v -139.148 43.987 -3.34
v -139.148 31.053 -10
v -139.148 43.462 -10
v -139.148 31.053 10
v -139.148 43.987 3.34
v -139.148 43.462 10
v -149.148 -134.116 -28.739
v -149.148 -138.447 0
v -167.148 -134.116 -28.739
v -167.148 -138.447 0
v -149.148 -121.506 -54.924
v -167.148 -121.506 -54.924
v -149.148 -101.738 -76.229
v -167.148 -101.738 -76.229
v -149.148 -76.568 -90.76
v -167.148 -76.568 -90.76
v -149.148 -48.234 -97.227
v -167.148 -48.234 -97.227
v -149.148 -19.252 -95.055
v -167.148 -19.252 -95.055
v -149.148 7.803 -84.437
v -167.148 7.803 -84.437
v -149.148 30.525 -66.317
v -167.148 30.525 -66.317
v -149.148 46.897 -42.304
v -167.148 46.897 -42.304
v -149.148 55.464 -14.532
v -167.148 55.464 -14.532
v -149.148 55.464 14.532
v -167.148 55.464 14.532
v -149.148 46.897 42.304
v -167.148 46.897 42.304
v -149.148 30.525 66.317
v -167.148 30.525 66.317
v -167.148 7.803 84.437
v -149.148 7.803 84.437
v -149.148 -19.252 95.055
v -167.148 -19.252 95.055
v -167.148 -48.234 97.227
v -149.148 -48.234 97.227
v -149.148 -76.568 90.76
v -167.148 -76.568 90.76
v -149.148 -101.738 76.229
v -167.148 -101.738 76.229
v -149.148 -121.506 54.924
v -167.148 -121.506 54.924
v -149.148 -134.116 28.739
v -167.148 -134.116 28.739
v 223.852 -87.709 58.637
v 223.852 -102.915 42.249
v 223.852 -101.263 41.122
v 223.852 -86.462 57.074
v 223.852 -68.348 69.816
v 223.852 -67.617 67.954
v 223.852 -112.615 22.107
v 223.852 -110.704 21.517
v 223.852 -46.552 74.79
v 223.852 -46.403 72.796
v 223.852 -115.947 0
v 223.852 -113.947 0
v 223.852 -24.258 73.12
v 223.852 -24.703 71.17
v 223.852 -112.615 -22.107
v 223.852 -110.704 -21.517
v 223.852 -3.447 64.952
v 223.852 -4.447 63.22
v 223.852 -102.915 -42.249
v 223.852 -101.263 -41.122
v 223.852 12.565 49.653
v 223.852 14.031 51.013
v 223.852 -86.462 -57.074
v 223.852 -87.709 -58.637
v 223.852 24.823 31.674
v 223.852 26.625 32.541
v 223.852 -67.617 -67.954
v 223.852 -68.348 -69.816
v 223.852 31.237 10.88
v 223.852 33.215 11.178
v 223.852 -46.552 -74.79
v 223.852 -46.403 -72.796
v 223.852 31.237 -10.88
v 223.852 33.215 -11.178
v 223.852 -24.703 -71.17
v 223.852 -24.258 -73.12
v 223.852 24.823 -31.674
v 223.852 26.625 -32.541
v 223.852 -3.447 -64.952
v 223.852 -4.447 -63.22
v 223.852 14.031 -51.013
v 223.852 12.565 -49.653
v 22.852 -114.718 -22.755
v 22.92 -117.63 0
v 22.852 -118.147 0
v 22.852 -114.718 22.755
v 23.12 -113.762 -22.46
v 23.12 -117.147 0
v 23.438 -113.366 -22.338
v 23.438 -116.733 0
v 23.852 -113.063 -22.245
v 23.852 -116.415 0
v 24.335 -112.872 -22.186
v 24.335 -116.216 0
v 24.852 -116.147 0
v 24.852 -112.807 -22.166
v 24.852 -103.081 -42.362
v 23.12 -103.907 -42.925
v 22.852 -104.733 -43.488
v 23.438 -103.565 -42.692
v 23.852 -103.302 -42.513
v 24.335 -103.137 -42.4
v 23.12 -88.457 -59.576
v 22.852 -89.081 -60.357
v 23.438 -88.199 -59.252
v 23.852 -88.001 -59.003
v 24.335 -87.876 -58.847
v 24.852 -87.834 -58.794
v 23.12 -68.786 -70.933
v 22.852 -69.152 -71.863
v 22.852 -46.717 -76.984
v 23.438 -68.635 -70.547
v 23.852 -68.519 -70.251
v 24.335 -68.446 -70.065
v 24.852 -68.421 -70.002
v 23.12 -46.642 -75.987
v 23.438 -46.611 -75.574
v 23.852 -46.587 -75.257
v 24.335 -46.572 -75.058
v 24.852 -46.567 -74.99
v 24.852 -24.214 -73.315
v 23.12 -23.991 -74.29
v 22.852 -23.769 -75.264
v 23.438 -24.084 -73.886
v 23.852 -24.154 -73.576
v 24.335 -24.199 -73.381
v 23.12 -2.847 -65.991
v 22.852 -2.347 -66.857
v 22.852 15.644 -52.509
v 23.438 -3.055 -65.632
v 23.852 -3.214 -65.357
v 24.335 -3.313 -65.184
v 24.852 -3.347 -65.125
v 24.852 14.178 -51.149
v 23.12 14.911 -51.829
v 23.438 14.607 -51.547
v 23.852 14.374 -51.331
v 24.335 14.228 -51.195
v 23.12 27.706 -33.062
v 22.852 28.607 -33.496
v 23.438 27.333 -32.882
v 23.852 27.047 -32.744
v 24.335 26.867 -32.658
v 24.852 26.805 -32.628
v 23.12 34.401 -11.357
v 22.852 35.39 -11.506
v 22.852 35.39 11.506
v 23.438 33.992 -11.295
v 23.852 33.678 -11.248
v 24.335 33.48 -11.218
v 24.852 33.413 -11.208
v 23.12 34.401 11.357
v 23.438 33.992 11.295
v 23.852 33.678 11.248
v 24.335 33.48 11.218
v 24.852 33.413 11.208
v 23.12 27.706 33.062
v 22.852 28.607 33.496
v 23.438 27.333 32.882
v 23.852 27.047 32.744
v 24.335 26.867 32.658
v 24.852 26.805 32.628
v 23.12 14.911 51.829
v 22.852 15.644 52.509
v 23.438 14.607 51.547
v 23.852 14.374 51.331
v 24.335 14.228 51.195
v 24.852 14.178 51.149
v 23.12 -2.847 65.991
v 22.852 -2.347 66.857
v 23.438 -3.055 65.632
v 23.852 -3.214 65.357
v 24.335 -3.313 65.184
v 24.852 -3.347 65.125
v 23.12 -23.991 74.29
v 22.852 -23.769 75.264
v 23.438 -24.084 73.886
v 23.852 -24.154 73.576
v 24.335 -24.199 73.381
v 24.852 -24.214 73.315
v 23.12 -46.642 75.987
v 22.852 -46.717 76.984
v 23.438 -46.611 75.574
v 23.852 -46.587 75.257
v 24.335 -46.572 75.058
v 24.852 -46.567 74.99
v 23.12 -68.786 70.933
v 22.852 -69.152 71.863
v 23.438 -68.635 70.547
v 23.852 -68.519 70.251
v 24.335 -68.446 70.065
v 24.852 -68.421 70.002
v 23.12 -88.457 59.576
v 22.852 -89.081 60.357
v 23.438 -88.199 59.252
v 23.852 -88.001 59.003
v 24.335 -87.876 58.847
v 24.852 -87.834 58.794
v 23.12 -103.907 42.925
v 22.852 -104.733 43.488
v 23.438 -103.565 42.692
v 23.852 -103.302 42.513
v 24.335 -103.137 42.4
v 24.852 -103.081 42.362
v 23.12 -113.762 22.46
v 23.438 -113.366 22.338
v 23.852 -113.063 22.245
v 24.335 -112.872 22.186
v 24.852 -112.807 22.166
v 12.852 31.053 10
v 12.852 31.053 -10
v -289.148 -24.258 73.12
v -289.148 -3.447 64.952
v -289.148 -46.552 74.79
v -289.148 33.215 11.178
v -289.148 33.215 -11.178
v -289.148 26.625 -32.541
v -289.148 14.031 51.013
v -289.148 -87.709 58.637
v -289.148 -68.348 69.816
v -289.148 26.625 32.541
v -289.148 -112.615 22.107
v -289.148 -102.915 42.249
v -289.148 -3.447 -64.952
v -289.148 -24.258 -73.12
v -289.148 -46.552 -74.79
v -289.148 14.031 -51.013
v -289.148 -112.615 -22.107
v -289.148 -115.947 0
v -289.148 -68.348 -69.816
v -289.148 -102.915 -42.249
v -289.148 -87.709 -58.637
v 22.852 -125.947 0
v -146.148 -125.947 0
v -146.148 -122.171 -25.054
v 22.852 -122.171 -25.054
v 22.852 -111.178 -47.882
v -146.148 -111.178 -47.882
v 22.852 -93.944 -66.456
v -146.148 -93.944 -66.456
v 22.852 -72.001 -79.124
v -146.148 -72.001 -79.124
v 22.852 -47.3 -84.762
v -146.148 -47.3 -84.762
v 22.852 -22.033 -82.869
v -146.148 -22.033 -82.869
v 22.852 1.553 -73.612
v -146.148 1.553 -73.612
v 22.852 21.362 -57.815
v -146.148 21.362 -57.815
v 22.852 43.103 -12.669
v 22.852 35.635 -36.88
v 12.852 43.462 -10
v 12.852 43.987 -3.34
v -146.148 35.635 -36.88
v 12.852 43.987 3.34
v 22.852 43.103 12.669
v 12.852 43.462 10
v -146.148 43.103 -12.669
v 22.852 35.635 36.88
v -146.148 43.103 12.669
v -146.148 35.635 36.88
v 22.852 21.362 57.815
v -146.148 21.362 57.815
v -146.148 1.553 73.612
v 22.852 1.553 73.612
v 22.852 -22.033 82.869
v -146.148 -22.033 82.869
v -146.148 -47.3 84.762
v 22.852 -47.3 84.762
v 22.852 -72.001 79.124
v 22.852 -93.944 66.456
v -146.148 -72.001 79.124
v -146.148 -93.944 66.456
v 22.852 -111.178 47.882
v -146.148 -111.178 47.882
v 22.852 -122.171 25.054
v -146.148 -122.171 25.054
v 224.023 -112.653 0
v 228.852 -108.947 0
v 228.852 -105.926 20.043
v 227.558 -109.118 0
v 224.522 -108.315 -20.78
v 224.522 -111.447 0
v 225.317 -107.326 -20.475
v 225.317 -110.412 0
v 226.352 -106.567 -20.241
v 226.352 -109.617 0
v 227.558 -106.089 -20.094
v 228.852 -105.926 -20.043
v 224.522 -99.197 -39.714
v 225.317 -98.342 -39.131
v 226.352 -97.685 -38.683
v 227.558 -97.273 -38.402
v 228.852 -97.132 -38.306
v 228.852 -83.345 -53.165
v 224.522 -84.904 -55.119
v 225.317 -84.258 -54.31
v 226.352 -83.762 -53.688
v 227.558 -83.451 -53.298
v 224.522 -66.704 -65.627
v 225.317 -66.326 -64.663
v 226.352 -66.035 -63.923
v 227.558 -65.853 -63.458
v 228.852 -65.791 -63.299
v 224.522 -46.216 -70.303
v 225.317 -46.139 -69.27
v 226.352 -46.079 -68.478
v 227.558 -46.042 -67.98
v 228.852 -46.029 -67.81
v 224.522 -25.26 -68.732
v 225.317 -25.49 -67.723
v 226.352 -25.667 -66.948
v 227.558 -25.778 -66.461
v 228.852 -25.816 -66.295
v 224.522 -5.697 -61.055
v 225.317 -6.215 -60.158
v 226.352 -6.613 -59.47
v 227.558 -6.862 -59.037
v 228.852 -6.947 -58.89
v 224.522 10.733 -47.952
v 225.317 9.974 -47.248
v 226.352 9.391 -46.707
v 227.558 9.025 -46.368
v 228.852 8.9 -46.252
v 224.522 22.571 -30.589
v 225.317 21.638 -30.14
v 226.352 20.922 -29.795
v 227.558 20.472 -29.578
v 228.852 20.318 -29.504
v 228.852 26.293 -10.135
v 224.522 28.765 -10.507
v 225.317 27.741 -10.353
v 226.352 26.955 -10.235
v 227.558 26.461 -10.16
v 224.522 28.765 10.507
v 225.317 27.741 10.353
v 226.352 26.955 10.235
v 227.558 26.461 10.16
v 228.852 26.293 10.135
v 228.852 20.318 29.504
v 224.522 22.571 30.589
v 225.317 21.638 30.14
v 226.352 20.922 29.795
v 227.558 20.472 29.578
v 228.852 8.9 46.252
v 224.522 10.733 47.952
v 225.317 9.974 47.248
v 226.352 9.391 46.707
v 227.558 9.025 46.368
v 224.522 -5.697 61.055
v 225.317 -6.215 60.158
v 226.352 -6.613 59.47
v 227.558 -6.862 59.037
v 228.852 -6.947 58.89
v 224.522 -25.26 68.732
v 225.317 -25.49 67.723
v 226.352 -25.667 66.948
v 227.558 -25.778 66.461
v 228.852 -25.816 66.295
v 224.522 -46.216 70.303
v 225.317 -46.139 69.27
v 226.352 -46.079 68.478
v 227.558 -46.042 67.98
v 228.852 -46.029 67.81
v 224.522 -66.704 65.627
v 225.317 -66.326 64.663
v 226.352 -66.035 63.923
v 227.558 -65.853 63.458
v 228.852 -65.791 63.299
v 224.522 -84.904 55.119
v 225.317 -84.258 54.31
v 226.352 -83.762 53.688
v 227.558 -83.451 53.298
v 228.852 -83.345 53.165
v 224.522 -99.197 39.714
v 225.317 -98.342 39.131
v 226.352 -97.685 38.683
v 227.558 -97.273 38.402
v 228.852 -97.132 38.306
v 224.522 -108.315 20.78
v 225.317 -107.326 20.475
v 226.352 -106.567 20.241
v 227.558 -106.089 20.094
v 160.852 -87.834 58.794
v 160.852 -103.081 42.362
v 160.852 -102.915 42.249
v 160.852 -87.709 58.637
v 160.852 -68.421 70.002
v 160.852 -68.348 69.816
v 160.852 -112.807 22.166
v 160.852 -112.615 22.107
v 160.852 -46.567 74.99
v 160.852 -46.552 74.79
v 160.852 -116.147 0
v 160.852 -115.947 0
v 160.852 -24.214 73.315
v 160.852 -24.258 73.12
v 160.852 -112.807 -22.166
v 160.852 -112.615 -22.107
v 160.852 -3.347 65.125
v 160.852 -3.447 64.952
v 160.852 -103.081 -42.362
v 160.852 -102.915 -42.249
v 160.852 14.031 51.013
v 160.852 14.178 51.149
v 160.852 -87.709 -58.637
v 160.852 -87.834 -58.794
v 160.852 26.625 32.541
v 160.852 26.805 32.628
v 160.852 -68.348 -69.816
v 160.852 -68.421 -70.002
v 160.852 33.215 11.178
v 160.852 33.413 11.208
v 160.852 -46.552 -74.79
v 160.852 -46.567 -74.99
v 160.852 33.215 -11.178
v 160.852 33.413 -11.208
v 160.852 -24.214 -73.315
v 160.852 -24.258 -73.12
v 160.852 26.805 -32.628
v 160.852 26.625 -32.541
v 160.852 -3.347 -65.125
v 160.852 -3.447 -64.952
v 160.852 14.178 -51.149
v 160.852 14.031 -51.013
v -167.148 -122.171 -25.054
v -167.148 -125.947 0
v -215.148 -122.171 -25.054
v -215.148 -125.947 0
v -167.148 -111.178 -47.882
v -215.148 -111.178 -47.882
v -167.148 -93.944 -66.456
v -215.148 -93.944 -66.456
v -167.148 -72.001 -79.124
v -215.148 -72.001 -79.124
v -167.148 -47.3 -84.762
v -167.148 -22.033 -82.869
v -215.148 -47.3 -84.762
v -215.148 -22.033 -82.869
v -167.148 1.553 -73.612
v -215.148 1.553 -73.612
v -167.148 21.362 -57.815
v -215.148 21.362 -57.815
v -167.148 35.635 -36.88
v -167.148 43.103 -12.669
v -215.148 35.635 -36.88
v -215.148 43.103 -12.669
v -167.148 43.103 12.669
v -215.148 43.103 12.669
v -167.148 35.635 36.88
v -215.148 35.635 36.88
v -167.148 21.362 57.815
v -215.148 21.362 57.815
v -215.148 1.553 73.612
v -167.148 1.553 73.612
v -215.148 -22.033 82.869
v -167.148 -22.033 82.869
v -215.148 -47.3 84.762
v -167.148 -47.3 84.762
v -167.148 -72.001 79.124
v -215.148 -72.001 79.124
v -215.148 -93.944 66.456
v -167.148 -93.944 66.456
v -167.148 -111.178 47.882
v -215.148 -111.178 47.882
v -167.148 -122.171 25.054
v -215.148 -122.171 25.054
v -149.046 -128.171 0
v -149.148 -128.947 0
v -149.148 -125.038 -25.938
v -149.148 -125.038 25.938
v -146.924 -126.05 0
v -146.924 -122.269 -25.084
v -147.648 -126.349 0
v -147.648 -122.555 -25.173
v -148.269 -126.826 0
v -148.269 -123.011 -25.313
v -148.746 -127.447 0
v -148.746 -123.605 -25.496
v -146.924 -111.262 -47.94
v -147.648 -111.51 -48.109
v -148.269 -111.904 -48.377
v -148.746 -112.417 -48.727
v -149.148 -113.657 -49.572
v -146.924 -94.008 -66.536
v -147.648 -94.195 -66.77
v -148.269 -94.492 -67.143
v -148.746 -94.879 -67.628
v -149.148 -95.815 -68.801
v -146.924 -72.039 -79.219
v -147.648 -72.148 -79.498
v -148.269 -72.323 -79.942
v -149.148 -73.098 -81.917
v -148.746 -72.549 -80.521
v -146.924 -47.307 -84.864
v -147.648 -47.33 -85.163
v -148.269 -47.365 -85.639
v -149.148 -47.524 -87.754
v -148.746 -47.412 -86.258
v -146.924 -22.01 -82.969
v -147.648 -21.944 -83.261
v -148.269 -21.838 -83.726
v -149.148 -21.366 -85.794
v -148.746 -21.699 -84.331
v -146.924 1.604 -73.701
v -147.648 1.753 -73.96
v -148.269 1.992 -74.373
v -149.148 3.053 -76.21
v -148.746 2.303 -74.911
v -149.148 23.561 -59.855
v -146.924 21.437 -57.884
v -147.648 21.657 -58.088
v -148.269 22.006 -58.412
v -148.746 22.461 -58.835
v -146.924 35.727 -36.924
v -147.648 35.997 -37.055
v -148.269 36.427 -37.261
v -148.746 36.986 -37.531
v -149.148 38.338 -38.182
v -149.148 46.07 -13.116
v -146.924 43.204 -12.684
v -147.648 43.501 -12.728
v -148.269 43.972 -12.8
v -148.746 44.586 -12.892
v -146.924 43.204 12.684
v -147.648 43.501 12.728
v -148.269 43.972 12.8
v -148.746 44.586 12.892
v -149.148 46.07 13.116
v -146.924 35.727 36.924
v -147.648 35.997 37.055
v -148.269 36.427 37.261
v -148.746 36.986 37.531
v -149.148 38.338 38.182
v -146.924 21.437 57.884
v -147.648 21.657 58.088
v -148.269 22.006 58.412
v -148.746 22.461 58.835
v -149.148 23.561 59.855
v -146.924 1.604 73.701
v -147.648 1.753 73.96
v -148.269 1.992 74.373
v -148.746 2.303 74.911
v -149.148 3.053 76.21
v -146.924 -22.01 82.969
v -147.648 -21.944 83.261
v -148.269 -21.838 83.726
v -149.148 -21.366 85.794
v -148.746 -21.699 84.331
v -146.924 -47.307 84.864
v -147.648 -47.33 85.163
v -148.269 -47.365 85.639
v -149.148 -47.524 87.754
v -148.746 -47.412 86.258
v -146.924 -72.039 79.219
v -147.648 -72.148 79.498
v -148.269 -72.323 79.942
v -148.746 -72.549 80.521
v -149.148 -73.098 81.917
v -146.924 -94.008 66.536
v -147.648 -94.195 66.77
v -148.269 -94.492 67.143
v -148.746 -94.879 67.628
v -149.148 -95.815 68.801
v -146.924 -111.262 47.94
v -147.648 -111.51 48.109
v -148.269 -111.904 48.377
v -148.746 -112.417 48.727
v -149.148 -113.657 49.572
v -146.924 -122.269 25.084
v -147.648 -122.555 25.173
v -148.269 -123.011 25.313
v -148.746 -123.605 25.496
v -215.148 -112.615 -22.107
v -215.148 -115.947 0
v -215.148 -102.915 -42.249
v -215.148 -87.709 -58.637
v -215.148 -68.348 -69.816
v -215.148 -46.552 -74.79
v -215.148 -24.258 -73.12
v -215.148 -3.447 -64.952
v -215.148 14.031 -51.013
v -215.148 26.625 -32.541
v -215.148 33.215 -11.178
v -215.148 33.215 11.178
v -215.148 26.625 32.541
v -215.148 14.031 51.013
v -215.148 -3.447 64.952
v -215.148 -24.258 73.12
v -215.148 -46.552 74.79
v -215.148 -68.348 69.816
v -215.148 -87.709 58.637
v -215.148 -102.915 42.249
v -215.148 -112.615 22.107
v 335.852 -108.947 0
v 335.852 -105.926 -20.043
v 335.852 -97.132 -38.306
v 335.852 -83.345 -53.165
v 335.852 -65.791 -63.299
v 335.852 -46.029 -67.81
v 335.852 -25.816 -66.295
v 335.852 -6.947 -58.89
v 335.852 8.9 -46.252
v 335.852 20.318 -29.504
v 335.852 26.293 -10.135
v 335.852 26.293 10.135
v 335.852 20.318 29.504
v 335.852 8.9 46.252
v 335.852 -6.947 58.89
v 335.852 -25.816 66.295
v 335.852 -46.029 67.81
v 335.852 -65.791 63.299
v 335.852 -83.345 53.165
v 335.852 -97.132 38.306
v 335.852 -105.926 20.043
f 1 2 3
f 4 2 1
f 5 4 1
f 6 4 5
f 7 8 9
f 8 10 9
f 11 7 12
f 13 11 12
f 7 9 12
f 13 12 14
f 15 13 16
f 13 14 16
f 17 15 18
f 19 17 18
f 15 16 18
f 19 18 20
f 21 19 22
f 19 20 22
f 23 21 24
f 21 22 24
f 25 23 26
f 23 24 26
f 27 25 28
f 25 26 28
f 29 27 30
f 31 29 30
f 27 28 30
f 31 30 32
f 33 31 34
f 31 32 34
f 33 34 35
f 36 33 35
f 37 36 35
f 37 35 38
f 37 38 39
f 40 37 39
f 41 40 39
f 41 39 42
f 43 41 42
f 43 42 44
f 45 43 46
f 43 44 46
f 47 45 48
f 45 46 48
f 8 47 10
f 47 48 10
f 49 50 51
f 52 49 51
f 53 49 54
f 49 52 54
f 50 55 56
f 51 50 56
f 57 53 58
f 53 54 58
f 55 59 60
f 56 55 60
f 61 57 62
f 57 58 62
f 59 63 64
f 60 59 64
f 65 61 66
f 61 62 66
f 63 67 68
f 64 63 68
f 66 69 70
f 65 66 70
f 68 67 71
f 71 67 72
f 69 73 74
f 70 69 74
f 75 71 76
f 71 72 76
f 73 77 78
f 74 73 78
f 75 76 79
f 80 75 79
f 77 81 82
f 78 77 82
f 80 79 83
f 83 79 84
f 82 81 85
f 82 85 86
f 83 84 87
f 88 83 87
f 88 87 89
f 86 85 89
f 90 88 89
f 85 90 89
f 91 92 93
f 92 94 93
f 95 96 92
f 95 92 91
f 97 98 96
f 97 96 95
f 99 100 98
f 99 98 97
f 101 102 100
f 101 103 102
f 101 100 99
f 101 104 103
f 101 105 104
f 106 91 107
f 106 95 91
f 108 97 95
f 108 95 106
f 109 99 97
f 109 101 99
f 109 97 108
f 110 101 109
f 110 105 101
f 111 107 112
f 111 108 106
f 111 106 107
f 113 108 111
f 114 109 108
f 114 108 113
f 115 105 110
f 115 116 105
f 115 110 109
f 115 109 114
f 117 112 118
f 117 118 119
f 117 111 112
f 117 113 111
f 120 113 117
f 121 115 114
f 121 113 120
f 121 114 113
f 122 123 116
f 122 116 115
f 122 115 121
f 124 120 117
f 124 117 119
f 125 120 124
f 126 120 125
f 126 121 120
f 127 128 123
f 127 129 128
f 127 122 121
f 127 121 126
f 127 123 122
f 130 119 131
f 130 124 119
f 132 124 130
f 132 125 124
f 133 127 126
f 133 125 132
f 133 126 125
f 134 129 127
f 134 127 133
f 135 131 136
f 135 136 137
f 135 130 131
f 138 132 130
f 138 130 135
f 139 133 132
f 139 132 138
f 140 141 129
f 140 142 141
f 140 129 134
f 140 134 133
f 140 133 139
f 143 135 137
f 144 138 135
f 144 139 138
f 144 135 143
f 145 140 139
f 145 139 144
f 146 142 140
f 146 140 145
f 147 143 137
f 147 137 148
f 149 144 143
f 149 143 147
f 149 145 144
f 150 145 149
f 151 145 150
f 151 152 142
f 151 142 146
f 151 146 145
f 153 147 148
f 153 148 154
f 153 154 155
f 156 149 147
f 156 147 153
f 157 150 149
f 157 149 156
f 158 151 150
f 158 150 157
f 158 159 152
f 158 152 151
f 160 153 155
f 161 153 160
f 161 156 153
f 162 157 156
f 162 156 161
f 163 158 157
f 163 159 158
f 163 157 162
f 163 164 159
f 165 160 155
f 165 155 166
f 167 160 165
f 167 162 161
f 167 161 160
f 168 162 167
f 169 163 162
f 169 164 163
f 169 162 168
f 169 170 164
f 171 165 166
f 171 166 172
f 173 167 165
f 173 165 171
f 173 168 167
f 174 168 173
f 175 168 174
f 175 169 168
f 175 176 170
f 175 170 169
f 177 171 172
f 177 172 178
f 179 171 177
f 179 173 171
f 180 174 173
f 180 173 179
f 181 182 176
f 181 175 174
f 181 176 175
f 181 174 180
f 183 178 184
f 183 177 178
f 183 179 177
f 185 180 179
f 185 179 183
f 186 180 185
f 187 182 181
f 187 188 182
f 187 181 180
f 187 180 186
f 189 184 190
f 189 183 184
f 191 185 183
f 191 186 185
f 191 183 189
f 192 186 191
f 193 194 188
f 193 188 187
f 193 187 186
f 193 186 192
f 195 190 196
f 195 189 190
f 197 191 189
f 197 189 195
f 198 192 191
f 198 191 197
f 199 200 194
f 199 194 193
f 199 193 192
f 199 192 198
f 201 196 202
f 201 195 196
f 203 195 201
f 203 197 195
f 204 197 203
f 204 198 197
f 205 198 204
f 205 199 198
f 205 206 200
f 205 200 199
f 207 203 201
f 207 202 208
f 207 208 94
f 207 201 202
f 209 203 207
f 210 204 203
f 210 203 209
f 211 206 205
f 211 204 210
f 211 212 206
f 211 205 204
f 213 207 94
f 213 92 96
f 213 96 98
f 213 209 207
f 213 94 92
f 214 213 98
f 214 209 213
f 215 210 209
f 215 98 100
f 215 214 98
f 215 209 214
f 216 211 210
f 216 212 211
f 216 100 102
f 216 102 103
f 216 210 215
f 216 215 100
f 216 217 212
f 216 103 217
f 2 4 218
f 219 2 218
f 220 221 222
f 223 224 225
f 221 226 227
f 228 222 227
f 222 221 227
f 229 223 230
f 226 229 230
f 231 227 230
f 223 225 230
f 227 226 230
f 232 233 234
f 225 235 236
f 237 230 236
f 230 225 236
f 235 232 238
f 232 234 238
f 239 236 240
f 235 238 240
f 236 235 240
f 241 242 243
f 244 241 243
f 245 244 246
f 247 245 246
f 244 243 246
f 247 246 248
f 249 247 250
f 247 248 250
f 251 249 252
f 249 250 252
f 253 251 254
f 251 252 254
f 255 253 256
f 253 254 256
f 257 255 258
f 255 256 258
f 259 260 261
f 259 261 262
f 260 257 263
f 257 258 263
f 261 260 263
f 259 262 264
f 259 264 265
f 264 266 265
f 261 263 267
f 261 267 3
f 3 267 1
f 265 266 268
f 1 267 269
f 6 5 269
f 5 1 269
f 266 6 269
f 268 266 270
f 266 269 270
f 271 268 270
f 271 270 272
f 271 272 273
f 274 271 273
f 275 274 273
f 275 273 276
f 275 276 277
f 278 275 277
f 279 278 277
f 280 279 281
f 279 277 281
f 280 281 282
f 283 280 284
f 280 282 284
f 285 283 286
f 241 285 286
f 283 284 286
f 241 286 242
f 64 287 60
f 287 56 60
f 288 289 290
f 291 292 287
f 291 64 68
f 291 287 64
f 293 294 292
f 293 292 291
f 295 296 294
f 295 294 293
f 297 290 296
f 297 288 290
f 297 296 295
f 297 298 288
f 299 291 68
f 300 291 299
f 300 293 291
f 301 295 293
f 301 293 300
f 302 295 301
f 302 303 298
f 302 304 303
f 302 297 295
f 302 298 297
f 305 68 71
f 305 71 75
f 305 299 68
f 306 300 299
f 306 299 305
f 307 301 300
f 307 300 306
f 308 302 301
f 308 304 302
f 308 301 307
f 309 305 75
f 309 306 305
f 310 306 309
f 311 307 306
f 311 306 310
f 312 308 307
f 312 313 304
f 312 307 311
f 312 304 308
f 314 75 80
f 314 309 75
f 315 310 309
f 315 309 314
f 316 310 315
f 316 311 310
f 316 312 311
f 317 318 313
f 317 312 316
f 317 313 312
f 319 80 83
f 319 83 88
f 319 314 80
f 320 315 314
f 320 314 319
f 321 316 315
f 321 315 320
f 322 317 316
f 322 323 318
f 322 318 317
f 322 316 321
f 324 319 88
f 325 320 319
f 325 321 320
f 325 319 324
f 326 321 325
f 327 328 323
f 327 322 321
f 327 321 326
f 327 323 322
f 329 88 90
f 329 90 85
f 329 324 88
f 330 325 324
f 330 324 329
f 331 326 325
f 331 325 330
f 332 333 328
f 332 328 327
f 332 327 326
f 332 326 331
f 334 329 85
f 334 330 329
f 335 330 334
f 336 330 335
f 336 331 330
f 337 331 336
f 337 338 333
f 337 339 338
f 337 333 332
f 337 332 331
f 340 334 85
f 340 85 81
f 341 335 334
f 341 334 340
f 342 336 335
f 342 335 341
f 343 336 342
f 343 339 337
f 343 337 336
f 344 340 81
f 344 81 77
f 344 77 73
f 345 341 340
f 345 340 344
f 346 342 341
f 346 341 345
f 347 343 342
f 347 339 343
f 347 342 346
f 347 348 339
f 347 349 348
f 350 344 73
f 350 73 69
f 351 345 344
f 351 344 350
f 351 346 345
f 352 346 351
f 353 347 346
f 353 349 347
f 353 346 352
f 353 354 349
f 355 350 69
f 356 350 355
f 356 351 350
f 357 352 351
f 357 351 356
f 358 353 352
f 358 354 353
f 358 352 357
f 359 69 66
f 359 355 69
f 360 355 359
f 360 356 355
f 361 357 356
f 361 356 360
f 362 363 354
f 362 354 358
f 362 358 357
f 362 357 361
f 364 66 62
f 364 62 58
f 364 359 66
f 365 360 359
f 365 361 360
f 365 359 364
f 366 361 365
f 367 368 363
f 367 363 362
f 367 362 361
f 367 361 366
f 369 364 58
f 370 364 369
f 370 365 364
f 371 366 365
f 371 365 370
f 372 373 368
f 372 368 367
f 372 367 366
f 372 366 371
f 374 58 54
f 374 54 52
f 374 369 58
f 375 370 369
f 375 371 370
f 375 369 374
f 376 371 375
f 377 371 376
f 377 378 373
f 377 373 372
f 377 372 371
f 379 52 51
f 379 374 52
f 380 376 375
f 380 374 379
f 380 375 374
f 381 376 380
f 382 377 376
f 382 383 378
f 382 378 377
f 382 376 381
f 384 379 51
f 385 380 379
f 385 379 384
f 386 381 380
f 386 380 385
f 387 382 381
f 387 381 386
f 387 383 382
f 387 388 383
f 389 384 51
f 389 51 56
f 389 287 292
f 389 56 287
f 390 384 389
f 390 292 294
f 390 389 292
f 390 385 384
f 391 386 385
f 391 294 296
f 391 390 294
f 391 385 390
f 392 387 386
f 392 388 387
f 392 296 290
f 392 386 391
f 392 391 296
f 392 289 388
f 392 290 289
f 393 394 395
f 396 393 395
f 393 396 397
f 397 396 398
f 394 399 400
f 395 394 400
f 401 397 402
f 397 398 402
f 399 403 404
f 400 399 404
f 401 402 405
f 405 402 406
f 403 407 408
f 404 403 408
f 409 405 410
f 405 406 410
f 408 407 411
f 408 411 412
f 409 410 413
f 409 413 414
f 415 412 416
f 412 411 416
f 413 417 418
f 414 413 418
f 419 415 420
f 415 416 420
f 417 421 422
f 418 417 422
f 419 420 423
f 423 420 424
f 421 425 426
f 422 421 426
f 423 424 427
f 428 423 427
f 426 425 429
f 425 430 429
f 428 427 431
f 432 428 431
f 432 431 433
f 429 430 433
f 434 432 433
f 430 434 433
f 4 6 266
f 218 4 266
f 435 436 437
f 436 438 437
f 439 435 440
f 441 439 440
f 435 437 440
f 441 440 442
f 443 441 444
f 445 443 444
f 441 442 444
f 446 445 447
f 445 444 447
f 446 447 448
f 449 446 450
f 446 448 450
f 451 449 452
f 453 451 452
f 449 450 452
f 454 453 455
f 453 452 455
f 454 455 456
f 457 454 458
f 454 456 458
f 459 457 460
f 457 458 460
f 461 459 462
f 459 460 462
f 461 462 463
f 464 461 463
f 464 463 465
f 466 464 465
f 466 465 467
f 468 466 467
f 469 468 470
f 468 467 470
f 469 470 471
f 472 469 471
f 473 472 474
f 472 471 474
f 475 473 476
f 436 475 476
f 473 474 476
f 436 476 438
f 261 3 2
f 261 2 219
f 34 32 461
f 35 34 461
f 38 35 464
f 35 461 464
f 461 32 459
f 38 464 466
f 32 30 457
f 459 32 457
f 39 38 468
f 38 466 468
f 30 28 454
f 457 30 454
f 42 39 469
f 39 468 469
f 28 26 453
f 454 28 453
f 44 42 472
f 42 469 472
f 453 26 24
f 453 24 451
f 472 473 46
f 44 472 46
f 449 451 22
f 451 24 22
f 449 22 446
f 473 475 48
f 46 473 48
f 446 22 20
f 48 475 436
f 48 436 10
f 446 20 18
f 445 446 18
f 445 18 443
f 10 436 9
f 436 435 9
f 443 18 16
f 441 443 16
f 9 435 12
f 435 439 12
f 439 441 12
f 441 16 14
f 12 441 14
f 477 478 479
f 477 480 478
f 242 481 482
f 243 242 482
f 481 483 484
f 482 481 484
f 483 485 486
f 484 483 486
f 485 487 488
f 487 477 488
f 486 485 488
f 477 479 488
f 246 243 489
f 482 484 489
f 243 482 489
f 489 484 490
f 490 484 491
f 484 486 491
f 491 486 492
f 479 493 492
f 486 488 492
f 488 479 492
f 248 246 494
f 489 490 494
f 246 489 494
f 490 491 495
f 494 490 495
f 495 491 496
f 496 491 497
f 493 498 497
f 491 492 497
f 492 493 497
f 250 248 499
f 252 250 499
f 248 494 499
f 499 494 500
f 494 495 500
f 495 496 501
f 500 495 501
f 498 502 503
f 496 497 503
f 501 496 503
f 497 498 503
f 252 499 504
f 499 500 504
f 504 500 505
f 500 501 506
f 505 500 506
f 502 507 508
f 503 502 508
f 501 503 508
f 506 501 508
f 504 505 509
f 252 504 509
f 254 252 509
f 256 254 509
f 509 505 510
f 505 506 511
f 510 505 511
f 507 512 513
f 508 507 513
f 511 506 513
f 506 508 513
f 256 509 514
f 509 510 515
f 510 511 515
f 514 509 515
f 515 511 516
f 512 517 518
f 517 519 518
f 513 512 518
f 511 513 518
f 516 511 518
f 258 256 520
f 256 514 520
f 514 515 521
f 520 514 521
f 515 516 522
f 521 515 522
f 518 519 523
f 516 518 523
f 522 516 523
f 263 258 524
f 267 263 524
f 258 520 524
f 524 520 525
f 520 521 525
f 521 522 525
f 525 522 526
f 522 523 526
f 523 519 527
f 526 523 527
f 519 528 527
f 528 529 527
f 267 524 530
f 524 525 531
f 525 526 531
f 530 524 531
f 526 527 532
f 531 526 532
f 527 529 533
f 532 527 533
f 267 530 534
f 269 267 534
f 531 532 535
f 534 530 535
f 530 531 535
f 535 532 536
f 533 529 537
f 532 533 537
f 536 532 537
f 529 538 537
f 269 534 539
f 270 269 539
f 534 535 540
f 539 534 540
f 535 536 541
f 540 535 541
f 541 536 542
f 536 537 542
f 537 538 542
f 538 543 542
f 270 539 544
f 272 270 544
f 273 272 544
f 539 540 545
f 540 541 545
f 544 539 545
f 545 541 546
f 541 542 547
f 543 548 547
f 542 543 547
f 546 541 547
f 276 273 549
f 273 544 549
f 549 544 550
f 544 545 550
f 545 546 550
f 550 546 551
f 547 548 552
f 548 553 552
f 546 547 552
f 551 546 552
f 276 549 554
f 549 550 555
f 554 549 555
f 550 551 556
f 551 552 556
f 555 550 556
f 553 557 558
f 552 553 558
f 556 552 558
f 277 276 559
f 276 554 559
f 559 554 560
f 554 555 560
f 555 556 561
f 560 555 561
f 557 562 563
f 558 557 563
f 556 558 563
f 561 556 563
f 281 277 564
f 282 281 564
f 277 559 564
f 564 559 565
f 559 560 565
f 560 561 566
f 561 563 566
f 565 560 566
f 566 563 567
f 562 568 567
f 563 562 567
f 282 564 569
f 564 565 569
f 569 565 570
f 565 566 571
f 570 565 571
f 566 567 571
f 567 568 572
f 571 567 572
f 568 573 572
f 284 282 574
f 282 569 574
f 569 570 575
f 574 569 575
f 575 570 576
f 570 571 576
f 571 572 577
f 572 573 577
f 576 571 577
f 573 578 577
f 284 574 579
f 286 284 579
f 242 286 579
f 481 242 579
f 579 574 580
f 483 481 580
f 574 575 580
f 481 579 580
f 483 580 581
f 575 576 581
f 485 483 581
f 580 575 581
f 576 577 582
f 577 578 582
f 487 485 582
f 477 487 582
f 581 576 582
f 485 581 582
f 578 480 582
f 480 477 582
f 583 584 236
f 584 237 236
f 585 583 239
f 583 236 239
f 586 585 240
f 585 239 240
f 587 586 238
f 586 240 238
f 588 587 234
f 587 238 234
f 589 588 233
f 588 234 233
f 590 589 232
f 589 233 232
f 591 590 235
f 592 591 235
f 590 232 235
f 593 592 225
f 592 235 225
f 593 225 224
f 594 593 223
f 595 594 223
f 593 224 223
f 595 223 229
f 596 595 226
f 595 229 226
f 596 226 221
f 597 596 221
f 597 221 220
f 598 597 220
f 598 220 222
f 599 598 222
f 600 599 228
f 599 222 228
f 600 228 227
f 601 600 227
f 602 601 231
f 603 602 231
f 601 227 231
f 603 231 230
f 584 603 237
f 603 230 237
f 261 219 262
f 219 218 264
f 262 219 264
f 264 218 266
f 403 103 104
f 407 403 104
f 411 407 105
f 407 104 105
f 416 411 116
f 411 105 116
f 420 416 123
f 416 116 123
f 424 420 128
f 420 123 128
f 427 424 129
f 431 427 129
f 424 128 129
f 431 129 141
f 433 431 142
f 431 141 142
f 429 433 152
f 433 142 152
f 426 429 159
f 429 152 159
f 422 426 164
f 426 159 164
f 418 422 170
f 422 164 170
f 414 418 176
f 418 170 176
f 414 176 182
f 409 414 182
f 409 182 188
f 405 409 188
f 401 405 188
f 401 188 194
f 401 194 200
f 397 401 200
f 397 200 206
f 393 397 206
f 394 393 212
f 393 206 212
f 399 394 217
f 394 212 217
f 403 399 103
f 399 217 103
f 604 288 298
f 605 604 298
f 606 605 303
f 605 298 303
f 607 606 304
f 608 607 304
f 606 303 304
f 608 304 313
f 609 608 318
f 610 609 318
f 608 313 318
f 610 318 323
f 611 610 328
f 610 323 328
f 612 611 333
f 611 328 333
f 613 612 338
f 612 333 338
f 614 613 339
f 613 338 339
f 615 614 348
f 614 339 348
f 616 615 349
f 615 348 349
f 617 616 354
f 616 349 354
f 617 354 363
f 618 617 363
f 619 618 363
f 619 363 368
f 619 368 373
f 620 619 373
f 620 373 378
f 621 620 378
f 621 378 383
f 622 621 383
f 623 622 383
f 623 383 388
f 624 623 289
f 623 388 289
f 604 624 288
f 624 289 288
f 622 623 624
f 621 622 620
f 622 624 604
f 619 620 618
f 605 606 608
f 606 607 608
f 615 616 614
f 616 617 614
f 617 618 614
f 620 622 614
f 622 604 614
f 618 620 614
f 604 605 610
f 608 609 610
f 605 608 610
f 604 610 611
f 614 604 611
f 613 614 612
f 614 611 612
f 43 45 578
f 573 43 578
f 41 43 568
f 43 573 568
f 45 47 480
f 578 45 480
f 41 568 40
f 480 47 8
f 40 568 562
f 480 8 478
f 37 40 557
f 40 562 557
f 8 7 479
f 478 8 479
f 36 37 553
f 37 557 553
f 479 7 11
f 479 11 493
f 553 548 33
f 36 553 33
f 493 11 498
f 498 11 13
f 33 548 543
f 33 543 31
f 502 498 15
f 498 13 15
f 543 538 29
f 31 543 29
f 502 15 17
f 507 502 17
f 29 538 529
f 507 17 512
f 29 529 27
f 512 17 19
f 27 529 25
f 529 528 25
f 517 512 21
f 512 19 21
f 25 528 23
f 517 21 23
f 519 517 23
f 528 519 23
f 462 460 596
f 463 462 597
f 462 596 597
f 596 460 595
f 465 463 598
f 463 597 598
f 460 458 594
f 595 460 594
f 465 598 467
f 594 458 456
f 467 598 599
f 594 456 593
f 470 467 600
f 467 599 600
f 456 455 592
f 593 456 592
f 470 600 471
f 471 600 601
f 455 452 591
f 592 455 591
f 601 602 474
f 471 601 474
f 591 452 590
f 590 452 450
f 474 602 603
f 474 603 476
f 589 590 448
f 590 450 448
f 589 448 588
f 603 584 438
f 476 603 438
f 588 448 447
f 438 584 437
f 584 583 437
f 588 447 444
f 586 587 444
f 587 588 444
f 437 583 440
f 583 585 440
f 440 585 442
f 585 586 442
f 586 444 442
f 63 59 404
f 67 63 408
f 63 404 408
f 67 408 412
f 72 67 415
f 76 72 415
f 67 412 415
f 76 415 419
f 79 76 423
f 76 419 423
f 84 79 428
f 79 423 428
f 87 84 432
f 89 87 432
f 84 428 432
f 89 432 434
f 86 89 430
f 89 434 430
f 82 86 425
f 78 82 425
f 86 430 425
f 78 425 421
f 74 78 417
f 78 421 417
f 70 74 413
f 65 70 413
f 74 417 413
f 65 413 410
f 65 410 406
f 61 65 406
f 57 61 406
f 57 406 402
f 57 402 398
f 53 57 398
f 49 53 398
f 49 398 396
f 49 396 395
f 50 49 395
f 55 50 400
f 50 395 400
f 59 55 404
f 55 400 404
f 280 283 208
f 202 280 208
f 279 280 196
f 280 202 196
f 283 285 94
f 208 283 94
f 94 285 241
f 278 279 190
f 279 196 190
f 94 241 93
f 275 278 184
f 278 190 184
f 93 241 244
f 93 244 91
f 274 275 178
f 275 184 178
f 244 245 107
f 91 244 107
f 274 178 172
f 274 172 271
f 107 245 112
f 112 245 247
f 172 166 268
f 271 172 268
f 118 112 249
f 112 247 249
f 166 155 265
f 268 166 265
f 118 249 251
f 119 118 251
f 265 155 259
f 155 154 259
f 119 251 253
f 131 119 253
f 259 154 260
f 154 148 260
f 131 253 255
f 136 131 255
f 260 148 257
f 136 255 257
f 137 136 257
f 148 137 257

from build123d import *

# Parameters (mm, degrees)
FILLET1_R          = 3
FILLET2_R          = 2
FILLET3_R          = 5
SKETCH2_W          = 152
SKETCH2_H          = 13
CUT_EXTRUDE2_DEPTH = 10


with BuildPart() as part:
    # Sketch1 → Revolve1 (revolve)
    with BuildSketch(Plane.XY, mode=Mode.PRIVATE) as revolve1_sk:
        Polygon((-289.147853111, -40.947499885), (335.852146889, -40.947499885), (335.852146889, 27.052500115), (223.852146889, 27.052500115), (223.852146889, 34.052500115), (160.852146889, 34.052500115), (160.852146889, 34.252500115), (22.852146889, 34.252500115), (22.852146889, 44.052500115), (-149.147853111, 44.052500115), (-149.147853111, 56.552500115), (-167.147853111, 56.552500115), (-167.147853111, 44.052500115), (-215.147853111, 44.052500115), (-215.147853111, 34.052500115), (-289.147853111, 34.052500115), align=None)
    revolve(revolve1_sk.sketch.rotate(Axis((-289.147853111, -40.947499885, 0), (1, 0, 0)), 180), axis=Axis((-289.147853111, -40.947499885, 0), (1, 0, 0)))

    # Fillet1
    fillet1_edges = [part.edges().sort_by_distance(p)[0] for p in [
        (-149.147853111, 44.052500115, 0),
    ]]
    fillet(fillet1_edges, radius=FILLET1_R)

    # Fillet2
    fillet2_edges = [part.edges().sort_by_distance(p)[0] for p in [
        (22.852146889, 34.252500115, 0),
    ]]
    fillet(fillet2_edges, radius=FILLET2_R)

    # Fillet3
    fillet3_edges = [part.edges().sort_by_distance(p)[0] for p in [
        (223.852146889, 27.052500115, 0),
    ]]
    fillet(fillet3_edges, radius=FILLET3_R)

    # Sketch2 → Cut-Extrude2 (cut, symmetric)
    with BuildSketch(Plane.XY):
        with Locations((-63.147853111, 37.552500115)):
            Rectangle(SKETCH2_W, SKETCH2_H)
    extrude(amount=CUT_EXTRUDE2_DEPTH, both=True, mode=Mode.SUBTRACT)


solid = part.part
